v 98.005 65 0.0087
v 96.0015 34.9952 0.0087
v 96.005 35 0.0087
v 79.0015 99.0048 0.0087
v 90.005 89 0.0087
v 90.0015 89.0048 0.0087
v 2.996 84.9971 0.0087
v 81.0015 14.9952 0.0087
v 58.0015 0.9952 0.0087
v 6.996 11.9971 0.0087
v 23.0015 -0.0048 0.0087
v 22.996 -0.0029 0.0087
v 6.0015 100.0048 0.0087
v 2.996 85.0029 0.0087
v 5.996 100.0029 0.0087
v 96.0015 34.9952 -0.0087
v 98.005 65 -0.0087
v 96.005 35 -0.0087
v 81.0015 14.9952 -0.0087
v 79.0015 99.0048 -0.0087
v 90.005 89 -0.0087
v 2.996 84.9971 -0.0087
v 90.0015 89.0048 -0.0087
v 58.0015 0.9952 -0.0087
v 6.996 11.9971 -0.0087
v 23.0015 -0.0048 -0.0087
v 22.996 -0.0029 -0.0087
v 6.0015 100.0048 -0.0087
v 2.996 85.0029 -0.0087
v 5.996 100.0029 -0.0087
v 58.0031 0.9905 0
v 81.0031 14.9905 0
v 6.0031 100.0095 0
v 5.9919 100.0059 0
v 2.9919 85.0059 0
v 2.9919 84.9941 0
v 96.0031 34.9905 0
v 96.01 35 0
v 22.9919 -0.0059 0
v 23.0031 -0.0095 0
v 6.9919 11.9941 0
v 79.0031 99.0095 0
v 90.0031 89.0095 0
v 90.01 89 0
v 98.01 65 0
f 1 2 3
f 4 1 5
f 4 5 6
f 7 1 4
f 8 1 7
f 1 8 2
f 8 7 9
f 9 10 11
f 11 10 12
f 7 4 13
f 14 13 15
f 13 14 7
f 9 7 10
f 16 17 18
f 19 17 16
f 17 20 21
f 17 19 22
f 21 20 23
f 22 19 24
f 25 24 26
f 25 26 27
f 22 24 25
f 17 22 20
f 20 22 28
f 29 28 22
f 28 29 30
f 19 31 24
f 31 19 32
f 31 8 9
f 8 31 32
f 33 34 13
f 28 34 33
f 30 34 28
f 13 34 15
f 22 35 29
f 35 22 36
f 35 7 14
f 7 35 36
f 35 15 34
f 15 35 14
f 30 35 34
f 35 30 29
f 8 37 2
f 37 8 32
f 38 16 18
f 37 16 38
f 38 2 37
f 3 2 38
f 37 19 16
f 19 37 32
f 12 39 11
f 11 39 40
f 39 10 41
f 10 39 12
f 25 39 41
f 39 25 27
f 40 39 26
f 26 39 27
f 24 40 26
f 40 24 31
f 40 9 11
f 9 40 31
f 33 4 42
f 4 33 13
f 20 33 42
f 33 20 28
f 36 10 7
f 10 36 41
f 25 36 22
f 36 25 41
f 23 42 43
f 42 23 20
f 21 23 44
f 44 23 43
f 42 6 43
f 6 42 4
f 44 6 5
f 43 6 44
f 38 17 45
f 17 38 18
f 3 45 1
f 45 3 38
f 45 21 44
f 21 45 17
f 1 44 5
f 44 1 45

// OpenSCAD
color([0.32750610520168044,0.511786711221762,0.09639677946248049]) hull(){
    translate([18,58]) sphere(0.01);
    translate([18,24]) sphere(0.01);
    translate([26,51]) sphere(0.01);
}
color([0.46647601470953737,0.043404226035316795,0.8089506697449751]) hull(){
    translate([18,58]) sphere(0.01);
    translate([18,24]) sphere(0.01);
    translate([7,12]) sphere(0.01);
}
color([0.9065579579370614,0.48874197586323487,0.4689182776921319]) hull(){
    translate([18,58]) sphere(0.01);
    translate([26,51]) sphere(0.01);
    translate([30,57]) sphere(0.01);
}
color([0.9999833648369341,0.42392948264922625,0.11056216143511133]) hull(){
    translate([18,58]) sphere(0.01);
    translate([30,57]) sphere(0.01);
    translate([16,79]) sphere(0.01);
}
color([0.5007484231317689,0.23725843071495933,0.7435751616565288]) hull(){
    translate([18,58]) sphere(0.01);
    translate([16,79]) sphere(0.01);
    translate([6,77]) sphere(0.01);
}
color([0.030326511183225713,0.9534383365251057,0.44454391677925087]) hull(){
    translate([18,58]) sphere(0.01);
    translate([6,77]) sphere(0.01);
    translate([7,12]) sphere(0.01);
}
color([0.4017260225039573,0.6984802625757133,0.14751428227125585]) hull(){
    translate([58,98]) sphere(0.01);
    translate([50,93]) sphere(0.01);
    translate([64,91]) sphere(0.01);
}
color([0.592053202978914,0.7602792343344718,0.23214841748979886]) hull(){
    translate([58,98]) sphere(0.01);
    translate([50,93]) sphere(0.01);
    translate([51,97]) sphere(0.01);
}
color([0.2215781656479593,0.24536616409996503,0.7021925659500807]) hull(){
    translate([58,98]) sphere(0.01);
    translate([39,98]) sphere(0.01);
    translate([18,99]) sphere(0.01);
}
color([0.5457605096294114,0.54011508338913,0.5459453680001618]) hull(){
    translate([58,98]) sphere(0.01);
    translate([39,98]) sphere(0.01);
    translate([51,97]) sphere(0.01);
}
color([0.21439919344985514,0.4167057873106884,0.6193494045718565]) hull(){
    translate([58,98]) sphere(0.01);
    translate([18,99]) sphere(0.01);
    translate([79,99]) sphere(0.01);
}
color([0.45760594266221877,0.8933837090972113,0.8109172526149769]) hull(){
    translate([58,98]) sphere(0.01);
    translate([70,96]) sphere(0.01);
    translate([79,99]) sphere(0.01);
}
color([0.14833972802097417,0.6068004170768148,0.5080529466064481]) hull(){
    translate([58,98]) sphere(0.01);
    translate([70,96]) sphere(0.01);
    translate([64,91]) sphere(0.01);
}
color([0.9906187087676633,0.11352393843166497,0.6883720652754897]) hull(){
    translate([22,90]) sphere(0.01);
    translate([20,83]) sphere(0.01);
    translate([30,90]) sphere(0.01);
}
color([0.5952346609945763,0.6540807806784664,0.3474259839548979]) hull(){
    translate([22,90]) sphere(0.01);
    translate([20,83]) sphere(0.01);
    translate([15,91]) sphere(0.01);
}
color([0.9928586924360654,0.247192741454632,0.70975753974483]) hull(){
    translate([22,90]) sphere(0.01);
    translate([18,99]) sphere(0.01);
    translate([31,91]) sphere(0.01);
}
color([0.13794757021236903,0.4611444179186315,0.04899626755467579]) hull(){
    translate([22,90]) sphere(0.01);
    translate([18,99]) sphere(0.01);
    translate([15,91]) sphere(0.01);
}
color([0.1977229983916683,0.036370797334404625,0.13840798504488894]) hull(){
    translate([22,90]) sphere(0.01);
    translate([31,91]) sphere(0.01);
    translate([30,90]) sphere(0.01);
}
color([0.695134065044521,0.2654011745990712,0.4635417367699751]) hull(){
    translate([50,93]) sphere(0.01);
    translate([39,98]) sphere(0.01);
    translate([37,88]) sphere(0.01);
}
color([0.14067843926211876,0.3233092624720053,0.6766209265725885]) hull(){
    translate([50,93]) sphere(0.01);
    translate([39,98]) sphere(0.01);
    translate([51,97]) sphere(0.01);
}
color([0.5598941248919586,0.2674263193966361,0.7715367321750608]) hull(){
    translate([50,93]) sphere(0.01);
    translate([59,71]) sphere(0.01);
    translate([38,83]) sphere(0.01);
}
color([0.7775867750177572,0.3358457771023752,0.7984986383285079]) hull(){
    translate([50,93]) sphere(0.01);
    translate([59,71]) sphere(0.01);
    translate([63,74]) sphere(0.01);
}
color([0.3608344962449672,0.130636609727118,0.1470050456404287]) hull(){
    translate([50,93]) sphere(0.01);
    translate([64,91]) sphere(0.01);
    translate([63,74]) sphere(0.01);
}
color([0.5817121628313788,0.46286602772829477,0.8824527290015699]) hull(){
    translate([50,93]) sphere(0.01);
    translate([37,88]) sphere(0.01);
    translate([38,83]) sphere(0.01);
}
color([0.1201105517589024,0.1938197880719691,0.4695931850983104]) hull(){
    translate([44,55]) sphere(0.01);
    translate([44,47]) sphere(0.01);
    translate([35,48]) sphere(0.01);
}
color([0.14078313852784263,0.6451769219884874,0.9811903017448982]) hull(){
    translate([44,55]) sphere(0.01);
    translate([44,47]) sphere(0.01);
    translate([77,50]) sphere(0.01);
}
color([0.8740229692652243,0.6541461711493592,0.21289315855754942]) hull(){
    translate([44,55]) sphere(0.01);
    translate([35,48]) sphere(0.01);
    translate([30,57]) sphere(0.01);
}
color([0.9328418457966335,0.42345059226773774,0.5012376899041451]) hull(){
    translate([44,55]) sphere(0.01);
    translate([77,50]) sphere(0.01);
    translate([46,61]) sphere(0.01);
}
color([0.5811541702347708,0.2791891573101454,0.2092311813057095]) hull(){
    translate([44,55]) sphere(0.01);
    translate([30,57]) sphere(0.01);
    translate([39,67]) sphere(0.01);
}
color([0.9628933046967749,0.6198760626942967,0.5999578261672418]) hull(){
    translate([44,55]) sphere(0.01);
    translate([46,61]) sphere(0.01);
    translate([39,67]) sphere(0.01);
}
color([0.23874719597172656,0.5159213977515871,0.8042715508319355]) hull(){
    translate([64,14]) sphere(0.01);
    translate([68,15]) sphere(0.01);
    translate([72,20]) sphere(0.01);
}
color([0.6755197251802578,0.41487488756696345,0.5733633065217538]) hull(){
    translate([64,14]) sphere(0.01);
    translate([68,15]) sphere(0.01);
    translate([58,1]) sphere(0.01);
}
color([0.8352652083788017,0.4789645616530247,0.8888242662849705]) hull(){
    translate([64,14]) sphere(0.01);
    translate([58,33]) sphere(0.01);
    translate([72,20]) sphere(0.01);
}
color([0.7977003312522131,0.4430245559395397,0.5757872208285841]) hull(){
    translate([64,14]) sphere(0.01);
    translate([58,33]) sphere(0.01);
    translate([55,32]) sphere(0.01);
}
color([0.18894415855786206,0.8084526775944827,0.5240727557148024]) hull(){
    translate([64,14]) sphere(0.01);
    translate([42,29]) sphere(0.01);
    translate([55,32]) sphere(0.01);
}
color([0.33009817895383553,0.6358447971330878,0.274476683198677]) hull(){
    translate([64,14]) sphere(0.01);
    translate([42,29]) sphere(0.01);
    translate([32,18]) sphere(0.01);
}
color([0.7036882936284021,0.9548751840233447,0.5755708060880032]) hull(){
    translate([64,14]) sphere(0.01);
    translate([32,18]) sphere(0.01);
    translate([58,1]) sphere(0.01);
}
color([0.41204698353559877,0.5796286851254486,0.28286322414623355]) hull(){
    translate([68,15]) sphere(0.01);
    translate([81,15]) sphere(0.01);
    translate([72,20]) sphere(0.01);
}
color([0.83488960487533,0.7968053445508819,0.9111606805714901]) hull(){
    translate([68,15]) sphere(0.01);
    translate([81,15]) sphere(0.01);
    translate([58,1]) sphere(0.01);
}
color([0.24277728252059738,0.2698201644401115,0.25372921938475945]) hull(){
    translate([10,94]) sphere(0.01);
    translate([18,99]) sphere(0.01);
    translate([15,91]) sphere(0.01);
}
color([0.3248429479181304,0.33731838939050207,0.46012102584031667]) hull(){
    translate([10,94]) sphere(0.01);
    translate([18,99]) sphere(0.01);
    translate([6,100]) sphere(0.01);
}
color([0.4972140619467261,0.4460540182101679,0.582257111213957]) hull(){
    translate([10,94]) sphere(0.01);
    translate([3,85]) sphere(0.01);
    translate([7,86]) sphere(0.01);
}
color([0.38189019333285656,0.9329183366158048,0.74346568951076]) hull(){
    translate([10,94]) sphere(0.01);
    translate([3,85]) sphere(0.01);
    translate([6,100]) sphere(0.01);
}
color([0.10367473231816282,0.6513301228797536,0.21210212161149367]) hull(){
    translate([10,94]) sphere(0.01);
    translate([7,86]) sphere(0.01);
    translate([15,91]) sphere(0.01);
}
color([0.4071949612628585,0.6715659813617996,0.17871221391606673]) hull(){
    translate([58,33]) sphere(0.01);
    translate([44,47]) sphere(0.01);
    translate([74,41]) sphere(0.01);
}
color([0.17752412341011714,0.6556599876579107,0.7040052939421468]) hull(){
    translate([58,33]) sphere(0.01);
    translate([44,47]) sphere(0.01);
    translate([45,42]) sphere(0.01);
}
color([0.9236087761692187,0.21340315940002685,0.5989435772305987]) hull(){
    translate([58,33]) sphere(0.01);
    translate([72,20]) sphere(0.01);
    translate([76,28]) sphere(0.01);
}
color([0.8450733127471588,0.6003349610680997,0.5954496070156984]) hull(){
    translate([58,33]) sphere(0.01);
    translate([55,32]) sphere(0.01);
    translate([45,42]) sphere(0.01);
}
color([0.920709623693076,0.4233833186292486,0.4754938941291812]) hull(){
    translate([58,33]) sphere(0.01);
    translate([74,41]) sphere(0.01);
    translate([76,28]) sphere(0.01);
}
color([0.872421437716006,0.9767589381362137,0.9086126193256788]) hull(){
    translate([6,84]) sphere(0.01);
    translate([3,85]) sphere(0.01);
    translate([6,77]) sphere(0.01);
}
color([0.7884233486788577,0.8262914624918754,0.6636415038118221]) hull(){
    translate([6,84]) sphere(0.01);
    translate([3,85]) sphere(0.01);
    translate([7,86]) sphere(0.01);
}
color([0.36270118963089737,0.5138414630226216,0.14357255994509865]) hull(){
    translate([6,84]) sphere(0.01);
    translate([16,79]) sphere(0.01);
    translate([6,77]) sphere(0.01);
}
color([0.466624584989368,0.29734697142143796,0.9844700368526675]) hull(){
    translate([6,84]) sphere(0.01);
    translate([16,79]) sphere(0.01);
    translate([7,86]) sphere(0.01);
}
color([0.6752891164641136,0.29017518075598103,0.4342964607752302]) hull(){
    translate([82,26]) sphere(0.01);
    translate([81,15]) sphere(0.01);
    translate([96,35]) sphere(0.01);
}
color([0.773003957160343,0.565247166210502,0.9239404304157245]) hull(){
    translate([82,26]) sphere(0.01);
    translate([81,15]) sphere(0.01);
    translate([79,27]) sphere(0.01);
}
color([0.16032310979410902,0.8355206000915061,0.5688487402091276]) hull(){
    translate([82,26]) sphere(0.01);
    translate([75,43]) sphere(0.01);
    translate([74,41]) sphere(0.01);
}
color([0.20030491603062106,0.9799112189115262,0.7788088383598656]) hull(){
    translate([82,26]) sphere(0.01);
    translate([75,43]) sphere(0.01);
    translate([96,35]) sphere(0.01);
}
color([0.3331229107175697,0.956723341350572,0.8892995412421422]) hull(){
    translate([82,26]) sphere(0.01);
    translate([74,41]) sphere(0.01);
    translate([79,27]) sphere(0.01);
}
color([0.9938355783742772,0.5564778243748569,0.9329279768345969]) hull(){
    translate([42,29]) sphere(0.01);
    translate([26,22]) sphere(0.01);
    translate([35,48]) sphere(0.01);
}
color([0.35340897744289224,0.12062022214202717,0.7238287945893779]) hull(){
    translate([42,29]) sphere(0.01);
    translate([26,22]) sphere(0.01);
    translate([32,18]) sphere(0.01);
}
color([0.8432397019629626,0.2883830928152321,0.23139986036280558]) hull(){
    translate([42,29]) sphere(0.01);
    translate([35,48]) sphere(0.01);
    translate([45,42]) sphere(0.01);
}
color([0.0180364627349191,0.35314011923198985,0.9589424474672257]) hull(){
    translate([42,29]) sphere(0.01);
    translate([55,32]) sphere(0.01);
    translate([45,42]) sphere(0.01);
}
color([0.2619290021782883,0.20369548429490625,0.5420815487250377]) hull(){
    translate([39,98]) sphere(0.01);
    translate([18,99]) sphere(0.01);
    translate([31,91]) sphere(0.01);
}
color([0.9221305525684157,0.837748898711002,0.8622867035840079]) hull(){
    translate([39,98]) sphere(0.01);
    translate([31,91]) sphere(0.01);
    translate([37,88]) sphere(0.01);
}
color([0.727429224436118,0.821332708873966,0.2567577523046298]) hull(){
    translate([26,22]) sphere(0.01);
    translate([18,24]) sphere(0.01);
    translate([26,51]) sphere(0.01);
}
color([0.1353372895865157,0.7613019869252476,0.15437996216449157]) hull(){
    translate([26,22]) sphere(0.01);
    translate([18,24]) sphere(0.01);
    translate([24,21]) sphere(0.01);
}
color([0.5724302025923821,0.22728732004270547,0.8377719495956792]) hull(){
    translate([26,22]) sphere(0.01);
    translate([26,51]) sphere(0.01);
    translate([35,48]) sphere(0.01);
}
color([0.3661955888727618,0.7135191579002272,0.515047468161266]) hull(){
    translate([26,22]) sphere(0.01);
    translate([24,21]) sphere(0.01);
    translate([32,18]) sphere(0.01);
}
color([0.13764795316468892,0.40448573996937276,0.8917260836787828]) hull(){
    translate([18,24]) sphere(0.01);
    translate([24,21]) sphere(0.01);
    translate([21,6]) sphere(0.01);
}
color([0.7643233656004556,0.5236824296690593,0.15029798138806982]) hull(){
    translate([18,24]) sphere(0.01);
    translate([7,12]) sphere(0.01);
    translate([21,6]) sphere(0.01);
}
color([0.9580407420374472,0.6000911555631969,0.025324835711835636]) hull(){
    translate([44,47]) sphere(0.01);
    translate([35,48]) sphere(0.01);
    translate([45,42]) sphere(0.01);
}
color([0.8628581448400192,0.48332959823715915,0.760144685355809]) hull(){
    translate([44,47]) sphere(0.01);
    translate([77,50]) sphere(0.01);
    translate([75,43]) sphere(0.01);
}
color([0.17349489212301172,0.7172022627612936,0.8738126079333703]) hull(){
    translate([44,47]) sphere(0.01);
    translate([75,43]) sphere(0.01);
    translate([74,41]) sphere(0.01);
}
color([0.7407081150283871,0.1750257628023656,0.7717601752613227]) hull(){
    translate([80,52]) sphere(0.01);
    translate([77,50]) sphere(0.01);
    translate([81,49]) sphere(0.01);
}
color([0.17462951192396858,0.1365817917740666,0.790898096633715]) hull(){
    translate([80,52]) sphere(0.01);
    translate([77,50]) sphere(0.01);
    translate([63,74]) sphere(0.01);
}
color([0.05068813004758421,0.2747417086491215,0.9775332998919624]) hull(){
    translate([80,52]) sphere(0.01);
    translate([81,49]) sphere(0.01);
    translate([91,55]) sphere(0.01);
}
color([0.3741990821064618,0.5760507248775137,0.9764706525564496]) hull(){
    translate([80,52]) sphere(0.01);
    translate([91,55]) sphere(0.01);
    translate([93,72]) sphere(0.01);
}
color([0.6412339051880062,0.9116486495874845,0.653753263894704]) hull(){
    translate([80,52]) sphere(0.01);
    translate([63,74]) sphere(0.01);
    translate([93,72]) sphere(0.01);
}
color([0.7391387592304974,0.7973855488942889,0.8338139774032114]) hull(){
    translate([26,51]) sphere(0.01);
    translate([35,48]) sphere(0.01);
    translate([30,57]) sphere(0.01);
}
color([0.5893068505654989,0.9387852932083598,0.6768105799142914]) hull(){
    translate([59,71]) sphere(0.01);
    translate([77,50]) sphere(0.01);
    translate([46,61]) sphere(0.01);
}
color([0.26314077483765086,0.6459233453457565,0.8790980253849315]) hull(){
    translate([59,71]) sphere(0.01);
    translate([77,50]) sphere(0.01);
    translate([63,74]) sphere(0.01);
}
color([0.15362837418895858,0.31061588741770185,0.8944360920803668]) hull(){
    translate([59,71]) sphere(0.01);
    translate([43,69]) sphere(0.01);
    translate([46,61]) sphere(0.01);
}
color([0.2723573567519545,0.029723278769515638,0.14137415559711708]) hull(){
    translate([59,71]) sphere(0.01);
    translate([43,69]) sphere(0.01);
    translate([38,83]) sphere(0.01);
}
color([0.24588268133825053,0.688989335517289,0.012833732972479917]) hull(){
    translate([20,83]) sphere(0.01);
    translate([16,79]) sphere(0.01);
    translate([15,91]) sphere(0.01);
}
color([0.4317421186444177,0.09476467904542085,0.2539030370426648]) hull(){
    translate([20,83]) sphere(0.01);
    translate([16,79]) sphere(0.01);
    translate([39,67]) sphere(0.01);
}
color([0.4433940275438375,0.6374619106411259,0.7629796076056016]) hull(){
    translate([20,83]) sphere(0.01);
    translate([38,83]) sphere(0.01);
    translate([30,90]) sphere(0.01);
}
color([0.33974962563874156,0.40746011996126574,0.8304662499681598]) hull(){
    translate([20,83]) sphere(0.01);
    translate([38,83]) sphere(0.01);
    translate([39,67]) sphere(0.01);
}
color([0.03737370743548629,0.7771030741686201,0.7450583503430228]) hull(){
    translate([81,15]) sphere(0.01);
    translate([72,20]) sphere(0.01);
    translate([79,27]) sphere(0.01);
}
color([0.7664898273962963,0.9635930682622835,0.37370940745190284]) hull(){
    translate([23,0]) sphere(0.01);
    translate([7,12]) sphere(0.01);
    translate([21,6]) sphere(0.01);
}
color([0.5269890278256799,0.7391003970289415,0.05440955639390033]) hull(){
    translate([23,0]) sphere(0.01);
    translate([32,18]) sphere(0.01);
    translate([21,6]) sphere(0.01);
}
color([0.16266859334294614,0.5860851836586503,0.6198514899274227]) hull(){
    translate([23,0]) sphere(0.01);
    translate([32,18]) sphere(0.01);
    translate([58,1]) sphere(0.01);
}
color([0.617768007375954,0.696939114622172,0.24987298892689824]) hull(){
    translate([77,50]) sphere(0.01);
    translate([81,49]) sphere(0.01);
    translate([75,43]) sphere(0.01);
}
color([0.10727882524928667,0.2542017095222042,0.647326061070541]) hull(){
    translate([18,99]) sphere(0.01);
    translate([79,99]) sphere(0.01);
    translate([6,100]) sphere(0.01);
}
color([0.6145129037504997,0.7319188036610002,0.2916410122362264]) hull(){
    translate([72,20]) sphere(0.01);
    translate([76,28]) sphere(0.01);
    translate([79,27]) sphere(0.01);
}
color([0.46410792523938205,0.009432899408237327,0.2601511175245954]) hull(){
    translate([24,21]) sphere(0.01);
    translate([32,18]) sphere(0.01);
    translate([21,6]) sphere(0.01);
}
color([0.9661595458779266,0.8212204941997756,0.9717572370221306]) hull(){
    translate([3,85]) sphere(0.01);
    translate([6,77]) sphere(0.01);
    translate([7,12]) sphere(0.01);
}
color([0.7094339661906762,0.3687560915635114,0.91551222113324]) hull(){
    translate([30,57]) sphere(0.01);
    translate([16,79]) sphere(0.01);
    translate([39,67]) sphere(0.01);
}
color([0.32058638357595914,0.6286861798780845,0.3438006598659582]) hull(){
    translate([81,49]) sphere(0.01);
    translate([75,43]) sphere(0.01);
    translate([96,35]) sphere(0.01);
}
color([0.6764002586894835,0.49002609359593985,0.6828992283474875]) hull(){
    translate([81,49]) sphere(0.01);
    translate([91,55]) sphere(0.01);
    translate([96,35]) sphere(0.01);
}
color([0.9457740861038292,0.48113916365283227,0.11743485119222763]) hull(){
    translate([16,79]) sphere(0.01);
    translate([7,86]) sphere(0.01);
    translate([15,91]) sphere(0.01);
}
color([0.6785611781392669,0.3559530637070777,0.24479389591231593]) hull(){
    translate([70,96]) sphere(0.01);
    translate([79,99]) sphere(0.01);
    translate([83,95]) sphere(0.01);
}
color([0.19718264729666257,0.5265513877214916,0.7820972605832109]) hull(){
    translate([70,96]) sphere(0.01);
    translate([64,91]) sphere(0.01);
    translate([67,87]) sphere(0.01);
}
color([0.016540899859545988,0.2649906914184337,0.6195666266963675]) hull(){
    translate([70,96]) sphere(0.01);
    translate([67,87]) sphere(0.01);
    translate([83,95]) sphere(0.01);
}
color([0.9400622663204184,0.8580807518186289,0.33004078082379396]) hull(){
    translate([31,91]) sphere(0.01);
    translate([37,88]) sphere(0.01);
    translate([30,90]) sphere(0.01);
}
color([0.9838273149753736,0.1297919343219498,0.6092048694604357]) hull(){
    translate([79,99]) sphere(0.01);
    translate([90,89]) sphere(0.01);
    translate([83,95]) sphere(0.01);
}
color([0.4362496777237921,0.204876863896859,0.7703581377154641]) hull(){
    translate([64,91]) sphere(0.01);
    translate([67,87]) sphere(0.01);
    translate([63,74]) sphere(0.01);
}
color([0.24016059236570497,0.9925708955515705,0.45030012798788]) hull(){
    translate([37,88]) sphere(0.01);
    translate([38,83]) sphere(0.01);
    translate([30,90]) sphere(0.01);
}
color([0.6687095525163839,0.6084946124880205,0.9354113971140408]) hull(){
    translate([67,87]) sphere(0.01);
    translate([63,74]) sphere(0.01);
    translate([93,72]) sphere(0.01);
}
color([0.40170597484563164,0.9257642462472301,0.7352475143256585]) hull(){
    translate([67,87]) sphere(0.01);
    translate([90,89]) sphere(0.01);
    translate([83,95]) sphere(0.01);
}
color([0.9040805991886998,0.8303556425691195,0.04360117165228117]) hull(){
    translate([67,87]) sphere(0.01);
    translate([90,89]) sphere(0.01);
    translate([93,72]) sphere(0.01);
}
color([0.19461635406133904,0.24937487606759356,0.948798389089598]) hull(){
    translate([43,69]) sphere(0.01);
    translate([46,61]) sphere(0.01);
    translate([39,67]) sphere(0.01);
}
color([0.463582495028668,0.8326751819056648,0.9518902994268229]) hull(){
    translate([43,69]) sphere(0.01);
    translate([38,83]) sphere(0.01);
    translate([39,67]) sphere(0.01);
}
color([0.6590575290507751,0.08125165305796267,0.4650668984349794]) hull(){
    translate([91,55]) sphere(0.01);
    translate([98,65]) sphere(0.01);
    translate([96,35]) sphere(0.01);
}
color([0.7959185631816963,0.11921151794914897,0.3955919798495292]) hull(){
    translate([91,55]) sphere(0.01);
    translate([98,65]) sphere(0.01);
    translate([93,72]) sphere(0.01);
}
color([0.9677071171037346,0.6413149765805175,0.6980206654320958]) hull(){
    translate([98,65]) sphere(0.01);
    translate([90,89]) sphere(0.01);
    translate([93,72]) sphere(0.01);
}
color([0.8040097371122532,0.02969664254607307,0.6148562424214081]) hull(){
    translate([74,41]) sphere(0.01);
    translate([76,28]) sphere(0.01);
    translate([79,27]) sphere(0.01);
}
